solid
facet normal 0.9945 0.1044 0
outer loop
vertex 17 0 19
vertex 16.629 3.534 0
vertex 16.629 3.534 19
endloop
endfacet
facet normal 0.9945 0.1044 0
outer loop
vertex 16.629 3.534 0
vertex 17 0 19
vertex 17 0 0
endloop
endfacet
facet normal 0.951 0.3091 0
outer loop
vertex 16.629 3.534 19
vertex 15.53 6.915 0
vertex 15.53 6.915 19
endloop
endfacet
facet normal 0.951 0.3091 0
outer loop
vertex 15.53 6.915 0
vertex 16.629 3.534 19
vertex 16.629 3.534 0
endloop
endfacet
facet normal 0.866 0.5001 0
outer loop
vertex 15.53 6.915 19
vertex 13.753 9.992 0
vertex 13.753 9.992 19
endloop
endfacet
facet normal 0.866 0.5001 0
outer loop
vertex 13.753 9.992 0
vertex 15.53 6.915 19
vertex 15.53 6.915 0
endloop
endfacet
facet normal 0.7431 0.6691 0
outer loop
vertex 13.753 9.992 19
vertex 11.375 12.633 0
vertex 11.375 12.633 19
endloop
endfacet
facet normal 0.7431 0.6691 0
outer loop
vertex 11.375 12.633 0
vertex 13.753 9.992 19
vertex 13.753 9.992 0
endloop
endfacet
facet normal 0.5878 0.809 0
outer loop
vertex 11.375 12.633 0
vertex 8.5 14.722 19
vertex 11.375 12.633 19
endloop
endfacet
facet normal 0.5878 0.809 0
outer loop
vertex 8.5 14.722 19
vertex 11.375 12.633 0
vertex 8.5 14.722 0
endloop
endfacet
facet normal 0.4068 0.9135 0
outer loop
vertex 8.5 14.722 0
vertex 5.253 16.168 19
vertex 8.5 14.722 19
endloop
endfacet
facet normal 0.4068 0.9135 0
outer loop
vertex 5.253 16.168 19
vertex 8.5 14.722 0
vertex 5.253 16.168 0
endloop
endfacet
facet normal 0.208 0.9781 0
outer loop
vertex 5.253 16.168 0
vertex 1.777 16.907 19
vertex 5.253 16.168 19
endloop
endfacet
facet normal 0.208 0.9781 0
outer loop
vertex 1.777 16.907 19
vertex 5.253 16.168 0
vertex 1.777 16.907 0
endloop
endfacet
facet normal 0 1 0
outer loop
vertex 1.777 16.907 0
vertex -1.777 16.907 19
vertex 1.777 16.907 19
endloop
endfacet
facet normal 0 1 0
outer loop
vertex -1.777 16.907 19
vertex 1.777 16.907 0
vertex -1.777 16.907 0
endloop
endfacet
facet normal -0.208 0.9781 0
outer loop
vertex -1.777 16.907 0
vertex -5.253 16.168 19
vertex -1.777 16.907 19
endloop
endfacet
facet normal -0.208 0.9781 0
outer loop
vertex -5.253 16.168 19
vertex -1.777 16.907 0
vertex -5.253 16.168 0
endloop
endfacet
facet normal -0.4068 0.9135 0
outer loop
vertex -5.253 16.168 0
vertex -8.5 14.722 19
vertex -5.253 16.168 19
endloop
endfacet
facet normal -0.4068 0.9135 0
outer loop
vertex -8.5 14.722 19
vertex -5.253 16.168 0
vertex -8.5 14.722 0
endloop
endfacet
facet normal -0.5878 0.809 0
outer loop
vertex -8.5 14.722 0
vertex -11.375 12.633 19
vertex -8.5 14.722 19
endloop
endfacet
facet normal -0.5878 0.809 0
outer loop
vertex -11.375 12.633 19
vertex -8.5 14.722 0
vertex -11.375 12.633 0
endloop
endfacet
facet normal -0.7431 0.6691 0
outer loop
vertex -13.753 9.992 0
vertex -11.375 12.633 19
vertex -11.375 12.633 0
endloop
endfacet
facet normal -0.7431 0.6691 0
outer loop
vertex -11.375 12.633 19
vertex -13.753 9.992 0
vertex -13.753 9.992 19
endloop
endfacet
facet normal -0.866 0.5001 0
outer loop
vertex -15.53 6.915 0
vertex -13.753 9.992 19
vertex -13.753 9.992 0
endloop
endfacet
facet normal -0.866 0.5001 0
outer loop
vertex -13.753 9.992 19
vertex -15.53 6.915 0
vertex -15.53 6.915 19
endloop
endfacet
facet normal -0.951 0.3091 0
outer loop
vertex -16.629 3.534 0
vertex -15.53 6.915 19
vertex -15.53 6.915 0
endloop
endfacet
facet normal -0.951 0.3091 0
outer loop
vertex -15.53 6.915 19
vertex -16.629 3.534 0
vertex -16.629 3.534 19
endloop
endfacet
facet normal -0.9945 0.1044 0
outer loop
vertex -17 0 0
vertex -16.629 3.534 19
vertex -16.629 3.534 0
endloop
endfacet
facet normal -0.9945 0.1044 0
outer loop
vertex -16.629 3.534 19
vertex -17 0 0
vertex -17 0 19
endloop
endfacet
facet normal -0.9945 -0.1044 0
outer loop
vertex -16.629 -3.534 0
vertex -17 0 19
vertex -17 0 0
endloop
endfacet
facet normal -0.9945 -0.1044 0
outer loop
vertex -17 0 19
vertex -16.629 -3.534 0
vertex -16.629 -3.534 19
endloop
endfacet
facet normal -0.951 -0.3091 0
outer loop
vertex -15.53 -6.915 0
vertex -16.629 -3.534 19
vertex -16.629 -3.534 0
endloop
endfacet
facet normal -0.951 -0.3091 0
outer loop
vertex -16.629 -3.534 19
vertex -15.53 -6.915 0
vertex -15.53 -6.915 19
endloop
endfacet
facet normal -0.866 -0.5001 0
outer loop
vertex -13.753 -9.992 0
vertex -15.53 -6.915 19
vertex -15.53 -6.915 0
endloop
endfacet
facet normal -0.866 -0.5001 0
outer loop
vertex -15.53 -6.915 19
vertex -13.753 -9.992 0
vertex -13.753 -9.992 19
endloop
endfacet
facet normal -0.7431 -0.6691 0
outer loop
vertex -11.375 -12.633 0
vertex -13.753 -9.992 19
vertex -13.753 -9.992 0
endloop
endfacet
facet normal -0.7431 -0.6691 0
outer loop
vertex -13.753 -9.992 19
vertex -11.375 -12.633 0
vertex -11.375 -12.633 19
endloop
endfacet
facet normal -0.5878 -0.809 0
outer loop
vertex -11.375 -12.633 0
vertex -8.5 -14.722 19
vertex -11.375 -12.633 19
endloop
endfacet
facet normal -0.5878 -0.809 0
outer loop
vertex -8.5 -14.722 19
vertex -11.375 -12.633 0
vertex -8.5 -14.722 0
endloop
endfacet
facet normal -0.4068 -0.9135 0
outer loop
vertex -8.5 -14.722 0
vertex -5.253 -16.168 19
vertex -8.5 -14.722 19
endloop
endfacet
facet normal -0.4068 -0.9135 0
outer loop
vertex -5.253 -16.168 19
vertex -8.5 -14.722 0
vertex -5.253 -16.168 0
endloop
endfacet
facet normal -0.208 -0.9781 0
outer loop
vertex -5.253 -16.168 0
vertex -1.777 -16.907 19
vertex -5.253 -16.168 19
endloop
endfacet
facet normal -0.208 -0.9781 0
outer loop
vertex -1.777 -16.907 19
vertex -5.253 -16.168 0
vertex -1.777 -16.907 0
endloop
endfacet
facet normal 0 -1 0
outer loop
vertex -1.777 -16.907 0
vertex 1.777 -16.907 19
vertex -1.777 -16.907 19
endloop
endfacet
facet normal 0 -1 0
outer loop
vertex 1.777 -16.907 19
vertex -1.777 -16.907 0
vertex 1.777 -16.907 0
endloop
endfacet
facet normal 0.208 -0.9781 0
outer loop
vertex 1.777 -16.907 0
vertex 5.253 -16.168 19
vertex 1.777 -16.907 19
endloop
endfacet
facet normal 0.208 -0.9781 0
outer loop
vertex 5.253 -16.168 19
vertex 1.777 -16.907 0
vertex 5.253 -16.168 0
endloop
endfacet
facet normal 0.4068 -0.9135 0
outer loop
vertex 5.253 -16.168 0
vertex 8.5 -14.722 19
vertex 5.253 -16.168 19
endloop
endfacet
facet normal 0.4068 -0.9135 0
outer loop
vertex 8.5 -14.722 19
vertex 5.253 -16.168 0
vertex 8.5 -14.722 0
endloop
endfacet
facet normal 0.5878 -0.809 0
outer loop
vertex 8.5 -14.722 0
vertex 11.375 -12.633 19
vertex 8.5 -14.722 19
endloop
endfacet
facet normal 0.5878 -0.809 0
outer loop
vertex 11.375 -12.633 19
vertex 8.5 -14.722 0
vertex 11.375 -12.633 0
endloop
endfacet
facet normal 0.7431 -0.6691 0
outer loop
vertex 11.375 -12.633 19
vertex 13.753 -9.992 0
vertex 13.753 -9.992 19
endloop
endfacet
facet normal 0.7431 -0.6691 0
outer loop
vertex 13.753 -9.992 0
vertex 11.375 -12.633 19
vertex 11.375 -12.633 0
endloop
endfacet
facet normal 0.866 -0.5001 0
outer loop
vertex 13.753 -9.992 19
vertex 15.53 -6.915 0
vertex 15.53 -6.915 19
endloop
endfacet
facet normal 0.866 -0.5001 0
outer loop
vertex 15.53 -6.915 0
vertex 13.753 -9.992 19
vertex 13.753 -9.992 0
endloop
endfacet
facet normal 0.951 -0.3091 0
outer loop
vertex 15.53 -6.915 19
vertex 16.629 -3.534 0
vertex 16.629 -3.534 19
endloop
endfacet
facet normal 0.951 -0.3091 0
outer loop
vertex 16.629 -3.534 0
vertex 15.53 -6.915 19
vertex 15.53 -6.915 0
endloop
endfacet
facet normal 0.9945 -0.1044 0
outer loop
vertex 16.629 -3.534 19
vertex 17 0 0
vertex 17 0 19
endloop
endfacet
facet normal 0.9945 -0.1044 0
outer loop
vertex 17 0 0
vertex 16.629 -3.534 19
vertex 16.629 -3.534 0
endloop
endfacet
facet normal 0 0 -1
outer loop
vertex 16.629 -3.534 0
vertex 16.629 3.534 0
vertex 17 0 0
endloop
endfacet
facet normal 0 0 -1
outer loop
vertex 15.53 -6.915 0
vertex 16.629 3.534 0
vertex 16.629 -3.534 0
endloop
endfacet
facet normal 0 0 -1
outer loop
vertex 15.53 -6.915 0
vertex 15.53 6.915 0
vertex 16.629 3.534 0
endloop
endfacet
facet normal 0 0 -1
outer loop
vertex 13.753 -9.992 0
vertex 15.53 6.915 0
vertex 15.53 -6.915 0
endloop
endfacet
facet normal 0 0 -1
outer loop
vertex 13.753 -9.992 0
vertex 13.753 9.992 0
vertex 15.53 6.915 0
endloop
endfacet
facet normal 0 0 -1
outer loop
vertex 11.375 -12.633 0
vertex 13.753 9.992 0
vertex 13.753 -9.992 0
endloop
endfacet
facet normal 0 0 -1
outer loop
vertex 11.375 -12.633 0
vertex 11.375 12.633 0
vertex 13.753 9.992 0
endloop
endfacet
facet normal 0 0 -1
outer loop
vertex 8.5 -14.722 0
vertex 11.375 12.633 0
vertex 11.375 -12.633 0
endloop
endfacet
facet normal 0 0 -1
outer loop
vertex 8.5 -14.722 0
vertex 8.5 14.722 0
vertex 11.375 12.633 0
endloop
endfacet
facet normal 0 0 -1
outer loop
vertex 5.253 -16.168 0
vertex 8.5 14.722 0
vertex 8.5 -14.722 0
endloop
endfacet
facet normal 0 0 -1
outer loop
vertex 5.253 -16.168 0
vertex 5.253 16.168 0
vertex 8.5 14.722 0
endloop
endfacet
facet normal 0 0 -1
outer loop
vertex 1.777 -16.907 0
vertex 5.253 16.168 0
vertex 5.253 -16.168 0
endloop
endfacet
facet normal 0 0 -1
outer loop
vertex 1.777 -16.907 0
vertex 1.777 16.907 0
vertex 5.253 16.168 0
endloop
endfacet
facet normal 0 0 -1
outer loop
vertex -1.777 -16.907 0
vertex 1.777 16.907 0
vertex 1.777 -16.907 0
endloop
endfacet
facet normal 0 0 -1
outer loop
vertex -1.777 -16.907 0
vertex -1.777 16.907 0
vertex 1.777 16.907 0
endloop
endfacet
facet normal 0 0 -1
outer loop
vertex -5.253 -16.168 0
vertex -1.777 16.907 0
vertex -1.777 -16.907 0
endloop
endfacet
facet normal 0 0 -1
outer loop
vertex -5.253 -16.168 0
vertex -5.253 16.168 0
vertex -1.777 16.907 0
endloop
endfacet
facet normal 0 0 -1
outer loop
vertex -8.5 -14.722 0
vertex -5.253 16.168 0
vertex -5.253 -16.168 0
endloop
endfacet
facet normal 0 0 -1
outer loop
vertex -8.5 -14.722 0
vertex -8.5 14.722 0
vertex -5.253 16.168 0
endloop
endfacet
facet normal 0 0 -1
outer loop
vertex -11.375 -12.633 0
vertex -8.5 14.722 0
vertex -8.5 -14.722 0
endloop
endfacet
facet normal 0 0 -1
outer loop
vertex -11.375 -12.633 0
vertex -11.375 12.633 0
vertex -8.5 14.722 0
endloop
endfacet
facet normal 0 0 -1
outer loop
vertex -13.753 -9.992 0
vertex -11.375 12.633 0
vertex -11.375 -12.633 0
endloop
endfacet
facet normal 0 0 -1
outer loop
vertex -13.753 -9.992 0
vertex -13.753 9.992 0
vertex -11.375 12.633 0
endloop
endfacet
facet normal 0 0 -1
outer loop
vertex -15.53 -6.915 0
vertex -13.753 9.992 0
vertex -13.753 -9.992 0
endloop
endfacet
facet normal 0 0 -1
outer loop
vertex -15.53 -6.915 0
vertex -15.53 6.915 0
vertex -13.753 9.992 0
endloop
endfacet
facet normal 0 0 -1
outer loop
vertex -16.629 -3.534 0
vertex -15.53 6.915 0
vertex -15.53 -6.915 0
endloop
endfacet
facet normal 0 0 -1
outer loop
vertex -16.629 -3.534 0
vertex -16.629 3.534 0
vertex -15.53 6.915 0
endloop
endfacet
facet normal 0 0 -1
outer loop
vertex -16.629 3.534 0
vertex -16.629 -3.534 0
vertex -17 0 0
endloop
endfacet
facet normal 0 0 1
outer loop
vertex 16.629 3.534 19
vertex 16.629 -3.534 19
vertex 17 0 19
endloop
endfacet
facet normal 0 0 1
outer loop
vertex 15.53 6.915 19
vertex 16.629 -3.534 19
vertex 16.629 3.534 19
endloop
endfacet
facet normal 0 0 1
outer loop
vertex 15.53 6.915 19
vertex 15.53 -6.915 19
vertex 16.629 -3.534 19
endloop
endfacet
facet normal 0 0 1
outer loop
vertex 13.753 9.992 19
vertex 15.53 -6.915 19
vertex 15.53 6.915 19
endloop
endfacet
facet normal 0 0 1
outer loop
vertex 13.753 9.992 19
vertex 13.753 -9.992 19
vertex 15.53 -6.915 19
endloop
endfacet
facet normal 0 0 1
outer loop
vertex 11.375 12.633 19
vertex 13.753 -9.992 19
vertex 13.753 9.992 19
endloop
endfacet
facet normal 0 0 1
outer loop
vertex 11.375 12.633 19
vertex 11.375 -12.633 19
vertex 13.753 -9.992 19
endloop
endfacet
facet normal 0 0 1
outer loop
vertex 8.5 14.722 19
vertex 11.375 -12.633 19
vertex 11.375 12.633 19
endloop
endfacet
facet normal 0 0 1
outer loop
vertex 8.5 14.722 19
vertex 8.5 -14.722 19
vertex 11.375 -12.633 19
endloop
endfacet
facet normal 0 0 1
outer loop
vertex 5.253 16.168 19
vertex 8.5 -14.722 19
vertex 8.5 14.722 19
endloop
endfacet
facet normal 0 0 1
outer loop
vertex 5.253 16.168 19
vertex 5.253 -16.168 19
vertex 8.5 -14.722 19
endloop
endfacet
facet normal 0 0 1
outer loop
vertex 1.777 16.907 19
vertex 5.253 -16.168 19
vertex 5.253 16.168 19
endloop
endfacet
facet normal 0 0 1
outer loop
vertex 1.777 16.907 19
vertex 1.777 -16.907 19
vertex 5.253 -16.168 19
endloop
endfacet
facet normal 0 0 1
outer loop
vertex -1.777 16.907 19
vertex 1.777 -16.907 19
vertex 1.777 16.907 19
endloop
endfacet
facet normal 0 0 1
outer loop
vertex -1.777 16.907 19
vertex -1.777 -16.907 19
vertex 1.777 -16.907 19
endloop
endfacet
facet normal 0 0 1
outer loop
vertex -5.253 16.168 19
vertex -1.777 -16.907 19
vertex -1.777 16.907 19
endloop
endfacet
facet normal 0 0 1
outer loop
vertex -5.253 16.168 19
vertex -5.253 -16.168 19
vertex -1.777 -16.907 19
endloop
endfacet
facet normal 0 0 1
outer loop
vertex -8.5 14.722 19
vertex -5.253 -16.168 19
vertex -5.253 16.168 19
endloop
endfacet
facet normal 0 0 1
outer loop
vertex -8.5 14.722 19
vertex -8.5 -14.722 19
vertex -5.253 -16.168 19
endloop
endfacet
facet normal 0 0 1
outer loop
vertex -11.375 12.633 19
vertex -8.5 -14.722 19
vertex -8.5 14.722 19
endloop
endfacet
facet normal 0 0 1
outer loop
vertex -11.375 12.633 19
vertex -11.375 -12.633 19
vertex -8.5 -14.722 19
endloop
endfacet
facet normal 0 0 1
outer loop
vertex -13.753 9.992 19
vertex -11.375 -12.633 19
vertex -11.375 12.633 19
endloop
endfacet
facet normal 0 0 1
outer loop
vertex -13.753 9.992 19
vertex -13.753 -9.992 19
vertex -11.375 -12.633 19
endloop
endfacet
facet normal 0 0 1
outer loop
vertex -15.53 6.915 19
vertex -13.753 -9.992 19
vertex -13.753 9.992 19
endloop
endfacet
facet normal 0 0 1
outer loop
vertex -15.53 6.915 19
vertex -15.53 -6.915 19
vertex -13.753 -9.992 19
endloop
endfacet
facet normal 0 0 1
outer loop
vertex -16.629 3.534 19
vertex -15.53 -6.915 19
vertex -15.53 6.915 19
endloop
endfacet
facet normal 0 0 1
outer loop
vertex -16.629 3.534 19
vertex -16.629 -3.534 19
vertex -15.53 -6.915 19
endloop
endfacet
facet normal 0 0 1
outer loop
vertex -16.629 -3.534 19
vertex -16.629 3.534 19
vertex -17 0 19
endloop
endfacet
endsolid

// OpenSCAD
// Generated by SolidPython 1.0.1 on 2020-07-29 00:46:45


cylinder(h = 19, r1 = 17, r2 = 17);
/***********************************************
*********      SolidPython code:      **********
************************************************
 
# import packages: SolidPython
from solid import *
from solid.utils import *
from itertools import chain, combinations, permutations


class Resize:

    def __init__(self, scad_file):
        self.scad_file = scad_file
        #self.scad_file = import_scad(scad_file)
        # cone/cylinder param:
        self.r1 = 0
        self.r2 = 0
        self.h = 0
        # rectangular prism param:
        self.w = 0
        self.l = 0
        # ellipse param:
        self.r = 0

    # import OpenScad code (file name corresponds to shape)


    # classify shape + parameters
    def assign(self, param1, param2, param3):
        if self.scad_file == 'cone.scad':
            self.r1 = param1
            self.r2 = param2
            self.h = param3
        elif self.scad_file == 'cylinder.scad':
            self.r1 = param1
            self.r2 = param2
            self.h = param3
        elif self.scad_file == 'rectangularPrism.scad':
            self.h = param1
            self.l = param2
            self.w = param3
        else:
            self.r = param1
            self.h = param2

    # resize parameters
    def iterate(self):
        x = range(3, 20, 2)
        i = 1
        if self.scad_file == 'cone.scad':
            tempList = list(permutations(x, 2))
            for temp in tempList:
                param1 = temp[0]
                param2 = temp[1]
                filepath = 'produced_scad_files/' + 'cone' + str(param1) + '_' + str(param2) + '_' + '.scad'
                scad_render_to_file(cylinder(h=param1, r1=param2, r2=0), filepath)

        elif self.scad_file == 'cylinder.scad':
            tempList = list(permutations(x, 3))
            for temp in tempList:
                param1 = temp[0]
                param2 = temp[1]
                filepath = 'produced_scad_files/' + 'cylinder' + str(param1) + '_' + str(param2) + '_' + '.scad'
                scad_render_to_file(cylinder(h=param1, r1=param2, r2=param2), filepath)

        elif self.scad_file == 'rectangularPrism.scad':
            tempList = list(permutations(x, 3))
            for temp in tempList:
                param1 = temp[0]
                param2 = temp[1]
                param3 = temp[2]
                filepath = 'produced_scad_files/' + 'rectangularPrism' + str(param1) + '_' + str(param2) + '_' + str(
                    param3) + '.scad'
                scad_render_to_file(cube(size=(param1, param2, param3)), filepath)

        elif self.scad_file == 'ellipse.scad':
            tempList = list(permutations(x, 4))
            for temp in tempList:
                param1 = temp[0]
                param2 = temp[1]
                param3 = temp[2]
                param4 = temp[3]
                filepath = 'produced_scad_files/' + 'ellipse' + str(param1) + '_' + str(param2) + '_' + str(param3) + '_' + str(param4) + '.scad'
                scad_render_to_file(scale([param1, param2, param3])(sphere(r=param4)), filepath)

    def render_to_scadfile(self):
        scad_render_to_file(scad, 'example.scad') 
 
************************************************/
